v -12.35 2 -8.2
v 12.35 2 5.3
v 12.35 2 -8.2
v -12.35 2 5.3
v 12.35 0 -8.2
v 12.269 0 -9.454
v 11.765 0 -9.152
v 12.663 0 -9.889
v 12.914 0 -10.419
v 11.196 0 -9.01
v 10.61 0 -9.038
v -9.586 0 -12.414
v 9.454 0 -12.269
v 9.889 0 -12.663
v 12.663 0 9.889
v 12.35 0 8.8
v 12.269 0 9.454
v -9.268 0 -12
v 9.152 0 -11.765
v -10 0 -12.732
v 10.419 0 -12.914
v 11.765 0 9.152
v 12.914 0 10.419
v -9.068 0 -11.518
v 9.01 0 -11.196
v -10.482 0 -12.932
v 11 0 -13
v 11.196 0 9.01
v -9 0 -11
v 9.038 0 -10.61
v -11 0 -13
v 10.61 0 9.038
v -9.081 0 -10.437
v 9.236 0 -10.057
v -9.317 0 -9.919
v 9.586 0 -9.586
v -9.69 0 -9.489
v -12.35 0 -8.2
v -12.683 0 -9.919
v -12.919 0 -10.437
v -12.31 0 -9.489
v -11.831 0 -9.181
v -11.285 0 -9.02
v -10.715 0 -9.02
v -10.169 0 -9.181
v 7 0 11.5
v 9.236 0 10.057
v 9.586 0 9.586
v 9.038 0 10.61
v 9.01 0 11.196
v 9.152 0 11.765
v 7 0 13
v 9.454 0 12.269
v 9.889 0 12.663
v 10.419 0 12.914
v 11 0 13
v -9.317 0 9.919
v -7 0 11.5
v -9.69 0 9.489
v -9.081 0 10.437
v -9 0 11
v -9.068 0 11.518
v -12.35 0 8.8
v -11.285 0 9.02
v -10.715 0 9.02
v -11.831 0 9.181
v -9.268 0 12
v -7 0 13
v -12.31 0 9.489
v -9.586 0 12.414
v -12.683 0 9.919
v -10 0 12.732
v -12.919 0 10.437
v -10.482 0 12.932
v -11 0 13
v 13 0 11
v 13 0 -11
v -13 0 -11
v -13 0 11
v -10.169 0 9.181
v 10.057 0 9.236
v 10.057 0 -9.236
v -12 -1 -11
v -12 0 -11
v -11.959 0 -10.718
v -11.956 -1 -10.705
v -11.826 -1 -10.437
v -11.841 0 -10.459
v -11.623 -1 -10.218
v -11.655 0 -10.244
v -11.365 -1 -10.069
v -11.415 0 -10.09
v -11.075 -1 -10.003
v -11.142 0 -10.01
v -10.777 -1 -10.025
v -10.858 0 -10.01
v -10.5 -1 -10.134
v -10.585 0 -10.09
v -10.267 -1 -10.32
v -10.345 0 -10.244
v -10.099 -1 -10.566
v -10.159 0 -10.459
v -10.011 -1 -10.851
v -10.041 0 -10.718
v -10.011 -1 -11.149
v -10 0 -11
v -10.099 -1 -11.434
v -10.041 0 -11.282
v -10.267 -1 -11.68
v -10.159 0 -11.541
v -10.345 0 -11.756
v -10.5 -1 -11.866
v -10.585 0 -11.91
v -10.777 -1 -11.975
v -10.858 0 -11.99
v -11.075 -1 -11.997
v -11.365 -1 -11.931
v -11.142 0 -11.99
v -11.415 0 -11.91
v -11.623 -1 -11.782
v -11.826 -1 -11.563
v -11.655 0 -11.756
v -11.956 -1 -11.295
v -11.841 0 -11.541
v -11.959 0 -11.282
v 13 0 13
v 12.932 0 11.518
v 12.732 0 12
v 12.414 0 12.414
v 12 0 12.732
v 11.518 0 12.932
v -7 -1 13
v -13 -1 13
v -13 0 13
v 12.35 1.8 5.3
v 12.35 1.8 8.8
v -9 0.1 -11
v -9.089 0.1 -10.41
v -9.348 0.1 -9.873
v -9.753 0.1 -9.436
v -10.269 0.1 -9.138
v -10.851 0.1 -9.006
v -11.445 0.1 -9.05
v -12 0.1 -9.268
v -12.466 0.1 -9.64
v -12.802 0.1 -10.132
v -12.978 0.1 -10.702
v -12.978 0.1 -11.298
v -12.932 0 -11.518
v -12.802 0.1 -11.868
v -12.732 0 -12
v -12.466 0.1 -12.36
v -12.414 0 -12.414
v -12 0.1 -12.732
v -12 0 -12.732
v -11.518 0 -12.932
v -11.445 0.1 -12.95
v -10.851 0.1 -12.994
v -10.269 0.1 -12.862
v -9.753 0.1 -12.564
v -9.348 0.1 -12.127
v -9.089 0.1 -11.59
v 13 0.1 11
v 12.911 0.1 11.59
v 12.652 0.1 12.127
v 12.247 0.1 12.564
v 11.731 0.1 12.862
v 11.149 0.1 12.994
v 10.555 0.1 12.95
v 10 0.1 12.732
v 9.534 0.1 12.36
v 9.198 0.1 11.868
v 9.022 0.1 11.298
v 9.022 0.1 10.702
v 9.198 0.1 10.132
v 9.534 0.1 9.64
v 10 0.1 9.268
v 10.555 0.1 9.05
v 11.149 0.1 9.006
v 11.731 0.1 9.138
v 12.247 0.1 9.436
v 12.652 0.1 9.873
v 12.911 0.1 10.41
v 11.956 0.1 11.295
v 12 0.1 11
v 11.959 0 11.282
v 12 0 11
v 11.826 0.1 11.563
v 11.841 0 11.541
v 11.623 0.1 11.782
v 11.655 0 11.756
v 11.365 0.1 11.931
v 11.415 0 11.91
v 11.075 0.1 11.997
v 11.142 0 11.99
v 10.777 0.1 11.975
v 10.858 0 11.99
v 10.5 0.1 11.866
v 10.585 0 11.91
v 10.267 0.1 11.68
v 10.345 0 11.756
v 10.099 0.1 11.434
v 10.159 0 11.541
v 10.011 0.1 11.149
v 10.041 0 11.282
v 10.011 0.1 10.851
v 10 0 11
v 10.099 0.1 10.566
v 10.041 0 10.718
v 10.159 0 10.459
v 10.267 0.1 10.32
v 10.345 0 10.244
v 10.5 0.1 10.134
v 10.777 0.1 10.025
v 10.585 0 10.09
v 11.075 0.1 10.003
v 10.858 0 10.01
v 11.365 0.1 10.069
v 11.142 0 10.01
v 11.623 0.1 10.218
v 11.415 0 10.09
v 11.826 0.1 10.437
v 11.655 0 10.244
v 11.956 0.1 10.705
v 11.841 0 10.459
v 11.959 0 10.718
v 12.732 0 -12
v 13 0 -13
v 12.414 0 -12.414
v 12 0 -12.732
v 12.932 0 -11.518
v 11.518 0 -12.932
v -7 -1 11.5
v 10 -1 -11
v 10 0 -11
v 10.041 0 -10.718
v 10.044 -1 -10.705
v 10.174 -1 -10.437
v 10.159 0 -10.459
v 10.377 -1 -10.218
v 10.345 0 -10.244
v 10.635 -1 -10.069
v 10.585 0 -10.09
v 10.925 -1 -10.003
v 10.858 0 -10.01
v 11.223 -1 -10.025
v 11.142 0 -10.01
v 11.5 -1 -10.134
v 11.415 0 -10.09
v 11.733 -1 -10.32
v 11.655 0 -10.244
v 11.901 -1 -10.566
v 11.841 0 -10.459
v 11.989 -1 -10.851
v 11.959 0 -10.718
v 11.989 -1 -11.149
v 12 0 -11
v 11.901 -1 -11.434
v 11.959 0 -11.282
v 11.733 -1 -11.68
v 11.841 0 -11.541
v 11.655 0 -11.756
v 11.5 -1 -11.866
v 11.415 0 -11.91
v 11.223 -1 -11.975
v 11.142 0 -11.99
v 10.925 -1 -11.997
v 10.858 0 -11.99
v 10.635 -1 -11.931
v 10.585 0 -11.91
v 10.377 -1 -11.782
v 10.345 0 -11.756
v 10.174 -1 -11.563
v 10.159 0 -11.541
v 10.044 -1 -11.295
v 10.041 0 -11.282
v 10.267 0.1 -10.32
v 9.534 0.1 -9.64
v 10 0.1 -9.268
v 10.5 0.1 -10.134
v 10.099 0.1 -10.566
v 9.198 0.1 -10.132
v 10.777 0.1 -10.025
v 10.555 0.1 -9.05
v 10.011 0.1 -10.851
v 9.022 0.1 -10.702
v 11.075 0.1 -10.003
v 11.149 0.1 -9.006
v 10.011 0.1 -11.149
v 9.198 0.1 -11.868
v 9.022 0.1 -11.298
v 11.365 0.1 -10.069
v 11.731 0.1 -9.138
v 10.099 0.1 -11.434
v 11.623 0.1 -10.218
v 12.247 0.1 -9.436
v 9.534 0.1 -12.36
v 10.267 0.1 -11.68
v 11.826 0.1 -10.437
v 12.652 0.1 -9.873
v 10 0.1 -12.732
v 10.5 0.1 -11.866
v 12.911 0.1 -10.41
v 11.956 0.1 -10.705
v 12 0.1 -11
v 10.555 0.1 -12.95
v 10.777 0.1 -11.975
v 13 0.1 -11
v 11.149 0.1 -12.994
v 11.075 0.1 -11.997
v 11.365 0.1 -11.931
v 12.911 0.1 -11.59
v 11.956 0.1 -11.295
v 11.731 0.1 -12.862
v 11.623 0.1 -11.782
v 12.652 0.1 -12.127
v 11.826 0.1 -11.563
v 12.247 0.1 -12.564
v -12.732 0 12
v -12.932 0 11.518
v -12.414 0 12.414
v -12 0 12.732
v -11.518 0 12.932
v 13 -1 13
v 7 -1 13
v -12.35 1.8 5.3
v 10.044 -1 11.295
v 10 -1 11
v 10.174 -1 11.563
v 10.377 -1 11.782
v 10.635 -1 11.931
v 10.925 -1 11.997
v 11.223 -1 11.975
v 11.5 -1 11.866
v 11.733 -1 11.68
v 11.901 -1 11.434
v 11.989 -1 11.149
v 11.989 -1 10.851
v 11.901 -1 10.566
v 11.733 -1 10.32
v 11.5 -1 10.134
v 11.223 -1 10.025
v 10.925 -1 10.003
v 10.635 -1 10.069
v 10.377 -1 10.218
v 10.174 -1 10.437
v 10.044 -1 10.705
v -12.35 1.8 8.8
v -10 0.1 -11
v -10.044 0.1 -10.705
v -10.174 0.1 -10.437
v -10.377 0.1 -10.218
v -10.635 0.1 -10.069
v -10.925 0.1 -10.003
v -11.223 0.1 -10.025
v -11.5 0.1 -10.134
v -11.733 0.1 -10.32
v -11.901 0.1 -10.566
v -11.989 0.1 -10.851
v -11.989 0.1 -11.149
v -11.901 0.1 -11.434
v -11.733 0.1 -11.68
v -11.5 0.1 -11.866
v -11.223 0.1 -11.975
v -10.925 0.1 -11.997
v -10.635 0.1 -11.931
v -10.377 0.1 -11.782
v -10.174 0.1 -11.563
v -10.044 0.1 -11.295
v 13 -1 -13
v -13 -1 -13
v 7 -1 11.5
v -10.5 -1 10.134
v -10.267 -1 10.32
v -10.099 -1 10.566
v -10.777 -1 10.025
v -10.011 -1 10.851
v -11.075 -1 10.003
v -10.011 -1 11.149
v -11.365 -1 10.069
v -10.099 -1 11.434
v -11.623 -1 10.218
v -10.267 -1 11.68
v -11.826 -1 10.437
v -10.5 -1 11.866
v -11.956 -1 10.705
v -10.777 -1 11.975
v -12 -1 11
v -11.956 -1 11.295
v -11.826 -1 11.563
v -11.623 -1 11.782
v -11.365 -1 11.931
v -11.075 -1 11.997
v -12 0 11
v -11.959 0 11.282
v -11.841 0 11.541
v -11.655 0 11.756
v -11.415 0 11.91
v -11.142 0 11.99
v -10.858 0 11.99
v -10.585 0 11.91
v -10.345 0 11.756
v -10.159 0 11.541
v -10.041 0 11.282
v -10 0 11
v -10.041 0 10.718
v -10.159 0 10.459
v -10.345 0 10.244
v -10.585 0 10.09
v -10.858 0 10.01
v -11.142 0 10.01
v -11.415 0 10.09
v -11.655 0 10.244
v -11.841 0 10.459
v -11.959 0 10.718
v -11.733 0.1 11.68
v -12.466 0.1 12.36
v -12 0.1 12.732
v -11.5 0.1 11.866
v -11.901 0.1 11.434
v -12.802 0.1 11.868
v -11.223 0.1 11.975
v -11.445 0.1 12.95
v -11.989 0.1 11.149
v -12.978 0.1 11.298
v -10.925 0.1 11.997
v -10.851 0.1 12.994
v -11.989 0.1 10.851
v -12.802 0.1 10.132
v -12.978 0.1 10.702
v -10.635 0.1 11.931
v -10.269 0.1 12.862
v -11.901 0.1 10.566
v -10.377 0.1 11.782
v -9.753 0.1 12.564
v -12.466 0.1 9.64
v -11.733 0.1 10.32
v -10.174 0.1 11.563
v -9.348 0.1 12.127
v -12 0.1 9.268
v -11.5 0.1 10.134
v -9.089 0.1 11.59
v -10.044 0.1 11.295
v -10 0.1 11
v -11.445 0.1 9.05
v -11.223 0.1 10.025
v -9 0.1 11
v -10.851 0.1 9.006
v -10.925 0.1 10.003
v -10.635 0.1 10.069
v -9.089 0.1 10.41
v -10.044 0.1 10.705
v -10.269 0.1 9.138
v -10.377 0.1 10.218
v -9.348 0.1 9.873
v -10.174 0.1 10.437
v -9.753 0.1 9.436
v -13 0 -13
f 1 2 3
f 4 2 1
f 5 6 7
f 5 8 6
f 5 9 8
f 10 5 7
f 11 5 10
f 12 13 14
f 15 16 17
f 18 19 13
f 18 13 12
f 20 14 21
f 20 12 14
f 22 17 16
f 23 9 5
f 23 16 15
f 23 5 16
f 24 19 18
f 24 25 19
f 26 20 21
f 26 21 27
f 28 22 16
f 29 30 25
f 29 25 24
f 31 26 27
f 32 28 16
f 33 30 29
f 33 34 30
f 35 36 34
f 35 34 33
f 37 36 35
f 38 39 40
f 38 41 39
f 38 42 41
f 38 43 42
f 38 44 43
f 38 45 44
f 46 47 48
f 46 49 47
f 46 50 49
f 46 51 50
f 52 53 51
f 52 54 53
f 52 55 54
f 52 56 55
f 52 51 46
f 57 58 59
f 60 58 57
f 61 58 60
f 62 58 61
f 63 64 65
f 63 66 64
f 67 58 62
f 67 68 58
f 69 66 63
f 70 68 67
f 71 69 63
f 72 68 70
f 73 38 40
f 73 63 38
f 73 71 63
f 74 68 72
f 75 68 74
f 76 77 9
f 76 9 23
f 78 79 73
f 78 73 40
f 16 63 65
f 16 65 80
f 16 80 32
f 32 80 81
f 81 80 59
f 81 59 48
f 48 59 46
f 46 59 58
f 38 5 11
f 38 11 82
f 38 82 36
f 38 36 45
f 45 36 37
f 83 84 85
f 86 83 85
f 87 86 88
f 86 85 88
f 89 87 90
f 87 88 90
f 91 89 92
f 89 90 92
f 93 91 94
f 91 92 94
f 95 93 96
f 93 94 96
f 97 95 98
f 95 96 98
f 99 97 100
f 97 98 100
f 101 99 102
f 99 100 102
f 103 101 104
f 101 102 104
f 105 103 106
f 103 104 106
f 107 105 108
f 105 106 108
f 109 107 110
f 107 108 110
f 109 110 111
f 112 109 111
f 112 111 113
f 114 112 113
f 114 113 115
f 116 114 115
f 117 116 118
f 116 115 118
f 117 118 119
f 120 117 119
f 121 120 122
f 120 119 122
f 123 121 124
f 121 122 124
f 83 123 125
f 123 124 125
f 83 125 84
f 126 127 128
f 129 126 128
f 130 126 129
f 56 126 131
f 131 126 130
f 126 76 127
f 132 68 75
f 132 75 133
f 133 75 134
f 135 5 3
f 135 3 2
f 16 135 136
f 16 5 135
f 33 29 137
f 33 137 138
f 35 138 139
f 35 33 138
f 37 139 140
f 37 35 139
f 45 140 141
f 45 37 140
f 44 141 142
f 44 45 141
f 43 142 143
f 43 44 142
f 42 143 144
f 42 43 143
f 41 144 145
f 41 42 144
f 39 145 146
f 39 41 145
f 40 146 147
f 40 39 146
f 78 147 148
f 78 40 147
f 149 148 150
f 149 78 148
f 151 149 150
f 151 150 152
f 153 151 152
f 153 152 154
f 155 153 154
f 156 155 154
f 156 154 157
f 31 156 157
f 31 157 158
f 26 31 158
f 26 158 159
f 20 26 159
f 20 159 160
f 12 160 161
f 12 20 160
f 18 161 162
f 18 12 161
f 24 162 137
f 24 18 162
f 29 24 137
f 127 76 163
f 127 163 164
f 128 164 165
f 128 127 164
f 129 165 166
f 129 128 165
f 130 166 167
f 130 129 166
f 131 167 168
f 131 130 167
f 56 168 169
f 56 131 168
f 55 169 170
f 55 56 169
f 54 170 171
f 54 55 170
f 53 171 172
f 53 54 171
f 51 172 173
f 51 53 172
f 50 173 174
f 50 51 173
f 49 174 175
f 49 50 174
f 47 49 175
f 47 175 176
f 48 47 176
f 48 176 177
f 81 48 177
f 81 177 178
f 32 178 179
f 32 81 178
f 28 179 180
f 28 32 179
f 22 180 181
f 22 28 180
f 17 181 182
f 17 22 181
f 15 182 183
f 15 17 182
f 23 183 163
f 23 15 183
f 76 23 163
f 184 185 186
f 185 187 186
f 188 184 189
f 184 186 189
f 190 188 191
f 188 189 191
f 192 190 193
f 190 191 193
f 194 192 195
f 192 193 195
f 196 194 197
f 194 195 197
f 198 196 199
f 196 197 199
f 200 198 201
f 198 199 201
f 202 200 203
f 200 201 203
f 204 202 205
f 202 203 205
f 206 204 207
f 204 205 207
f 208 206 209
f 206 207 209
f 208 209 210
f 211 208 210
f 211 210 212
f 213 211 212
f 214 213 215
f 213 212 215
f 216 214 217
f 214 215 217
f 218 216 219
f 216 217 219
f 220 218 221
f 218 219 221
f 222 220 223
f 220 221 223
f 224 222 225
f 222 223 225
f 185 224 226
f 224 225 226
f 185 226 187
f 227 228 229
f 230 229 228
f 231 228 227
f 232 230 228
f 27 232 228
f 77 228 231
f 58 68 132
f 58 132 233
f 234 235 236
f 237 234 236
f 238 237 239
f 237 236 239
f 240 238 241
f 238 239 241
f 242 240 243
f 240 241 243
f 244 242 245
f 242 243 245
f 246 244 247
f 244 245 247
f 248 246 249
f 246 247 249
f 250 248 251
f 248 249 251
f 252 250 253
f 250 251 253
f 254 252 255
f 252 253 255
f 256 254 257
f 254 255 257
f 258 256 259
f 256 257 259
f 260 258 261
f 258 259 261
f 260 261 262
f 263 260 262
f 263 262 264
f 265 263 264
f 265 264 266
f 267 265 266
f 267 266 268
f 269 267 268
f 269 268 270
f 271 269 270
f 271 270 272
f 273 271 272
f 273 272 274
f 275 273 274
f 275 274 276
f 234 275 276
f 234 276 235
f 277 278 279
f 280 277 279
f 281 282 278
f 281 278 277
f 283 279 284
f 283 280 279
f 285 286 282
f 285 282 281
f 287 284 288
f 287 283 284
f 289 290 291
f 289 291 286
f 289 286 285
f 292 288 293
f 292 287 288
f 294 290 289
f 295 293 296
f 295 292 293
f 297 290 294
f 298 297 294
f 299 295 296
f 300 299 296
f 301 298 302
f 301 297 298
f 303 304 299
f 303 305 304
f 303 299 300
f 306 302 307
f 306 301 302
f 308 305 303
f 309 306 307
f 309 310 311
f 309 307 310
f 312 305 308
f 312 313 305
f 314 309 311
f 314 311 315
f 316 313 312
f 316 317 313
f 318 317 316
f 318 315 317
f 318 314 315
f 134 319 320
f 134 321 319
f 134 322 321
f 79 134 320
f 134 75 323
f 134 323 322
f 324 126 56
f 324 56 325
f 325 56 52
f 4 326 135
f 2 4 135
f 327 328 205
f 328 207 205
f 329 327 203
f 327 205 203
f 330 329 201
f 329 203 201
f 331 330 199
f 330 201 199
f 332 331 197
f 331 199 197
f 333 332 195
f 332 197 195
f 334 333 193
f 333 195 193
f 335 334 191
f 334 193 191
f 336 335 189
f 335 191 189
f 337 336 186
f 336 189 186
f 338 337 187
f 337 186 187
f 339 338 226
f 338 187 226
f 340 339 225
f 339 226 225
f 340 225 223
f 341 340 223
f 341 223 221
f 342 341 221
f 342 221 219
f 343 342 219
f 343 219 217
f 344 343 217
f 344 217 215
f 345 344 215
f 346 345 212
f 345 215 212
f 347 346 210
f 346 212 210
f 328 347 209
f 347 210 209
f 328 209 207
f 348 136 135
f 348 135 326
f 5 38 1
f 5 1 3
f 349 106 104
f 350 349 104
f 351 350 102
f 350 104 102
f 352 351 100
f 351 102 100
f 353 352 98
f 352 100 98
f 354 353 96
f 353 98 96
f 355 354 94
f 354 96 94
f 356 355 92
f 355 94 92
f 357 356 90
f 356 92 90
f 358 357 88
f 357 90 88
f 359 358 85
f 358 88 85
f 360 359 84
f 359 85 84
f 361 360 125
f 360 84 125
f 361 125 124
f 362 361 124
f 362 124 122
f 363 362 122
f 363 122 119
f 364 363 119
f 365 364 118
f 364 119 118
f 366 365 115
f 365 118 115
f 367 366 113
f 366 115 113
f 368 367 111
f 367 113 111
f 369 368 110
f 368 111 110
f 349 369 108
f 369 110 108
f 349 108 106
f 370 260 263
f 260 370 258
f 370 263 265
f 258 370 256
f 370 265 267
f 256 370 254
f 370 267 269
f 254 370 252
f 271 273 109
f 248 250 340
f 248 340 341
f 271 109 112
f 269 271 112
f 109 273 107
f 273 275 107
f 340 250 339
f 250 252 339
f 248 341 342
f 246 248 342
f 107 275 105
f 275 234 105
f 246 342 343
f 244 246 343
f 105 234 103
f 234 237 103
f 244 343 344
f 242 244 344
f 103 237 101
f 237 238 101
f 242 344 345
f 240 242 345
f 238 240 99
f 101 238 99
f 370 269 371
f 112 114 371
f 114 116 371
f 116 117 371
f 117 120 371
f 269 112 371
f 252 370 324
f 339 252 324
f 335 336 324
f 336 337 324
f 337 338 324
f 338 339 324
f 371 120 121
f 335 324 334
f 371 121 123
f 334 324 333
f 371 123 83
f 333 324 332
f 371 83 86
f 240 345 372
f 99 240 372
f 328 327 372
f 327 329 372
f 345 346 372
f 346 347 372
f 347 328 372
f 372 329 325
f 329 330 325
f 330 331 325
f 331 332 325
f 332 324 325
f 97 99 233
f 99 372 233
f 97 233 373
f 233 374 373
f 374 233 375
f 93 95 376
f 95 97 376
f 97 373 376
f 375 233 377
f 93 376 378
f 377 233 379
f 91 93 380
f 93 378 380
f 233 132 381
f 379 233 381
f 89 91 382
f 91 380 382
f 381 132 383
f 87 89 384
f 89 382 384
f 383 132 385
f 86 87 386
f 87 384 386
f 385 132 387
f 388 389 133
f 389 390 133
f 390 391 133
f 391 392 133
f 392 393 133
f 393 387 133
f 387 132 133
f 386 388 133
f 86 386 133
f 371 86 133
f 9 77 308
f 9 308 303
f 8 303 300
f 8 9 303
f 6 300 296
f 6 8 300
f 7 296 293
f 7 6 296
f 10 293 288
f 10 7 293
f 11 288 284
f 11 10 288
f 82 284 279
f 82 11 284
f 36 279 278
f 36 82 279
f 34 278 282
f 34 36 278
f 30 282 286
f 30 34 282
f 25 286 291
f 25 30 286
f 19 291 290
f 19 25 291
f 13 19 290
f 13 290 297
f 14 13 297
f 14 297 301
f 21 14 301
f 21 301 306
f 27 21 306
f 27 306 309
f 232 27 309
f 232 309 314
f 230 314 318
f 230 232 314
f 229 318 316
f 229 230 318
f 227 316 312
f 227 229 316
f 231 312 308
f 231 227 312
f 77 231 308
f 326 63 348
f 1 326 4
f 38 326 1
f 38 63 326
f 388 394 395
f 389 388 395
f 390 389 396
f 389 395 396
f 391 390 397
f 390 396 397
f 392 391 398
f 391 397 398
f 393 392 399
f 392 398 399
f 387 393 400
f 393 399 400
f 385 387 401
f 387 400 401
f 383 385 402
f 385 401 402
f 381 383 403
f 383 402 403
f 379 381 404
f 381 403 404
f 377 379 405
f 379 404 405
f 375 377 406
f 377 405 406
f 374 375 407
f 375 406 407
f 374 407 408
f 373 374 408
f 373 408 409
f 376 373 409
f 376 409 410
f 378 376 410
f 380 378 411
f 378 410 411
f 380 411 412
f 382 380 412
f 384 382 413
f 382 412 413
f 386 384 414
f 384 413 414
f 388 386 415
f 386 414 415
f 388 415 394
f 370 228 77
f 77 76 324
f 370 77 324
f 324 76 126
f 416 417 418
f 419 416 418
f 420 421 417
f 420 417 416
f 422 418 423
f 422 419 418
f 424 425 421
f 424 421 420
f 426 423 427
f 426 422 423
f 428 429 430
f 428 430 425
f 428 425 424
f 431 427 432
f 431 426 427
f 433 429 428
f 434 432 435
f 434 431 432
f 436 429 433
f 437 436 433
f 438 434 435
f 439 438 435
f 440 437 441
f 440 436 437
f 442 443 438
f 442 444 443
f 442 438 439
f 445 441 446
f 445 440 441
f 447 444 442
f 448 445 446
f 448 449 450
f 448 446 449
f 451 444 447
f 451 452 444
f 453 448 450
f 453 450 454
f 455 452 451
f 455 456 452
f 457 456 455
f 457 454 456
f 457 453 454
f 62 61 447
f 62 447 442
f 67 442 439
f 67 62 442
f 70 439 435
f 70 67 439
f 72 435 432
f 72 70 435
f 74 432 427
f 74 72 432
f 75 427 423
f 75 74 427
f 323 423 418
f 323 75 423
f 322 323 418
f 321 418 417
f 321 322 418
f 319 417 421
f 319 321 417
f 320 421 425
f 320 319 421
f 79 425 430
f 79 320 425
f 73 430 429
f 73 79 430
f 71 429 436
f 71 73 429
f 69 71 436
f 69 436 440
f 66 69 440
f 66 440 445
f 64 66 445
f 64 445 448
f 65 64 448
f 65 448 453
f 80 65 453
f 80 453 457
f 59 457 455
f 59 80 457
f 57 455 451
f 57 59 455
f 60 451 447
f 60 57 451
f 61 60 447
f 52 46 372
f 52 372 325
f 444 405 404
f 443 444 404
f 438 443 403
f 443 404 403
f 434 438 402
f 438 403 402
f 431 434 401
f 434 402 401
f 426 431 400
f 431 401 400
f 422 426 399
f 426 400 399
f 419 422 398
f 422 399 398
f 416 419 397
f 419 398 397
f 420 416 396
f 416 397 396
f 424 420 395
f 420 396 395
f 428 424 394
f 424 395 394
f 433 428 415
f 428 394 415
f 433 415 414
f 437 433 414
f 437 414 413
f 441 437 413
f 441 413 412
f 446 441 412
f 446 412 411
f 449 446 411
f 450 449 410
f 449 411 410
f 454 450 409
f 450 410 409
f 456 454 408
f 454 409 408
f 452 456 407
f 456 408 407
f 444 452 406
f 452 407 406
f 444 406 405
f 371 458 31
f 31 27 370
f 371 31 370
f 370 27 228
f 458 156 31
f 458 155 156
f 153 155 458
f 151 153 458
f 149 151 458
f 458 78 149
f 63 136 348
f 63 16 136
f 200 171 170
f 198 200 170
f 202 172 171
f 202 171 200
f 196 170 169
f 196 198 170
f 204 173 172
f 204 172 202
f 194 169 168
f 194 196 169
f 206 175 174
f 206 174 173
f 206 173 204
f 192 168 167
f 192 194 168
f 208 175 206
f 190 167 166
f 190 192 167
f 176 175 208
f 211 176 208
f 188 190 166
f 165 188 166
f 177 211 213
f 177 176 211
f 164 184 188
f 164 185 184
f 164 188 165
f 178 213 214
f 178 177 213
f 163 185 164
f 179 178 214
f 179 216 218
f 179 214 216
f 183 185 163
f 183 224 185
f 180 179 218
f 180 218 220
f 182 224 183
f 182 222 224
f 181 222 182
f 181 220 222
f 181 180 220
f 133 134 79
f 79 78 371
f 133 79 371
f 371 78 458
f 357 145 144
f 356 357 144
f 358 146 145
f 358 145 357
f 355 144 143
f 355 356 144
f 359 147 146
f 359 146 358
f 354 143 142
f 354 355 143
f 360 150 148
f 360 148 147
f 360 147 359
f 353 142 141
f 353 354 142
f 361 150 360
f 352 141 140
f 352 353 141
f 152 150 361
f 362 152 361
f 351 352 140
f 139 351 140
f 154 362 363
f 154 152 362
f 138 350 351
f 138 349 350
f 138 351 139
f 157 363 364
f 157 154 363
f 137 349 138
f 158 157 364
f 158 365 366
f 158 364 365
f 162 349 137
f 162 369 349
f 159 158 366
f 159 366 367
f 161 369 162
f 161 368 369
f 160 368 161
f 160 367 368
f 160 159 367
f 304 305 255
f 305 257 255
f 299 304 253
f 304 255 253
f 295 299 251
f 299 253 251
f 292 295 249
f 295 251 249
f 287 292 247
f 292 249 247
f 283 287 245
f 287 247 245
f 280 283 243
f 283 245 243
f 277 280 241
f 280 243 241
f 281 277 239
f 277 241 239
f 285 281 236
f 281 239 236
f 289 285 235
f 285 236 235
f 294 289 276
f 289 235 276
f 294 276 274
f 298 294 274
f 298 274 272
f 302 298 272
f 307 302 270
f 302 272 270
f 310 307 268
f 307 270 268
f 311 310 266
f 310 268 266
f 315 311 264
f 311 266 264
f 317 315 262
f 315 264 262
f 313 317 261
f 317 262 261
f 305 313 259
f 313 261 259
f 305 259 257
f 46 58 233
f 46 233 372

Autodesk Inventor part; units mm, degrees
ref_plane "YZ Plane" through (0, 0, 0) normal (1, 0, 0) x (0, 1, 0)
ref_plane "XZ Plane" through (0, 0, 0) normal (0, 1, 0) x (-1, 0, 0)
ref_plane "XY Plane" through (0, 0, 0) normal (0, 0, 1) x (1, 0, 0)
sketch "스케치1" plane through (0, 0, 0) normal (0, 1, 0) x (-1, 0, 0)
  line L0 (-13, 13) -> (13, 13)
  line L1 (13, 13) -> (13, -13)
  line L2 (13, -13) -> (-13, -13)
  line L3 (-13, -13) -> (-13, 13)
  line L4 (-13, 13) -> (13, -13) construction
  line L5 (13, 13) -> (-13, -13) construction
  circle A0 centre (11, 11) radius 1
  line L6 (12.35, -8.2) -> (-12.35, -8.2)
  line L7 (-12.35, -8.2) -> (-12.35, 8.8)
  line L8 (-12.35, 8.8) -> (12.35, 8.8)
  line L9 (12.35, 8.8) -> (12.35, -8.2)
  line L10 (12.35, 5.3) -> (-12.35, 5.3)
  line L11 (0, 0) -> (0, -5.5368) construction
  line L12 (0, 0) -> (-4.847, 0) construction
  circle A1 centre (-11, 11) radius 1
  circle A2 centre (11, -11) radius 1
  circle A3 centre (-11, -11) radius 1
  dimension "d0" = 26
  dimension "d1" = 26
  dimension "d5" = 2
  dimension "d6" = 2
  dimension "d14" = 2
  dimension "d15" = 24.7
  dimension "d16" = 17
  dimension "d17" = 4.8
  dimension "d18" = 13.5
extrude "돌출1" add sketch "스케치1" against normal blind 1 contours L0 L1 L2 L3 | L6 L7 L10 L9 | L10 L7 L8 L9
extrude "돌출3" add sketch "스케치1" along normal blind 2 contours L6 L7 L10 L9
extrude "돌출4" add sketch "스케치1" along normal blind 1.8 contours L10 L7 L8 L9
sketch "스케치2" plane through (0, 0, 0) normal (0, 1, 0) x (1, 0, 0)
  line L0 (-7, -11.5) -> (7, -11.5)
  line L1 (7, -11.5) -> (7, -14.5)
  line L2 (7, -14.5) -> (-7, -14.5)
  line L3 (-7, -14.5) -> (-7, -11.5)
  line L4 (13, -13) -> (-13, -13) projected
  line L5 (-7, -11.5) -> (7, -14.5) construction
  line L6 (7, -11.5) -> (-7, -14.5) construction
  point P0 (0, 0)
  point P1 (0, -13)
  dimension "d23" = 14
  dimension "d24" = 3
extrude "돌출5" cut sketch "스케치2" against normal blind 16.75
sketch "스케치3" plane through (0, 0, 0) normal (0, 1, 0) x (1, 0, 0)
  circle A0 centre (-11, 11) radius 1 projected
  circle A1 centre (-11, 11) radius 2
  circle A2 centre (11, 11) radius 1 projected
  circle A3 centre (11, 11) radius 2
  circle A4 centre (11, -11) radius 1 projected
  circle A5 centre (11, -11) radius 2
  circle A6 centre (-11, -11) radius 1 projected
  circle A7 centre (-11, -11) radius 2
  point P0 (0, 0)
  dimension "d27" = 4
extrude "돌출6" add sketch "스케치3" along normal blind 0.1
properties part number "OLED Display"
